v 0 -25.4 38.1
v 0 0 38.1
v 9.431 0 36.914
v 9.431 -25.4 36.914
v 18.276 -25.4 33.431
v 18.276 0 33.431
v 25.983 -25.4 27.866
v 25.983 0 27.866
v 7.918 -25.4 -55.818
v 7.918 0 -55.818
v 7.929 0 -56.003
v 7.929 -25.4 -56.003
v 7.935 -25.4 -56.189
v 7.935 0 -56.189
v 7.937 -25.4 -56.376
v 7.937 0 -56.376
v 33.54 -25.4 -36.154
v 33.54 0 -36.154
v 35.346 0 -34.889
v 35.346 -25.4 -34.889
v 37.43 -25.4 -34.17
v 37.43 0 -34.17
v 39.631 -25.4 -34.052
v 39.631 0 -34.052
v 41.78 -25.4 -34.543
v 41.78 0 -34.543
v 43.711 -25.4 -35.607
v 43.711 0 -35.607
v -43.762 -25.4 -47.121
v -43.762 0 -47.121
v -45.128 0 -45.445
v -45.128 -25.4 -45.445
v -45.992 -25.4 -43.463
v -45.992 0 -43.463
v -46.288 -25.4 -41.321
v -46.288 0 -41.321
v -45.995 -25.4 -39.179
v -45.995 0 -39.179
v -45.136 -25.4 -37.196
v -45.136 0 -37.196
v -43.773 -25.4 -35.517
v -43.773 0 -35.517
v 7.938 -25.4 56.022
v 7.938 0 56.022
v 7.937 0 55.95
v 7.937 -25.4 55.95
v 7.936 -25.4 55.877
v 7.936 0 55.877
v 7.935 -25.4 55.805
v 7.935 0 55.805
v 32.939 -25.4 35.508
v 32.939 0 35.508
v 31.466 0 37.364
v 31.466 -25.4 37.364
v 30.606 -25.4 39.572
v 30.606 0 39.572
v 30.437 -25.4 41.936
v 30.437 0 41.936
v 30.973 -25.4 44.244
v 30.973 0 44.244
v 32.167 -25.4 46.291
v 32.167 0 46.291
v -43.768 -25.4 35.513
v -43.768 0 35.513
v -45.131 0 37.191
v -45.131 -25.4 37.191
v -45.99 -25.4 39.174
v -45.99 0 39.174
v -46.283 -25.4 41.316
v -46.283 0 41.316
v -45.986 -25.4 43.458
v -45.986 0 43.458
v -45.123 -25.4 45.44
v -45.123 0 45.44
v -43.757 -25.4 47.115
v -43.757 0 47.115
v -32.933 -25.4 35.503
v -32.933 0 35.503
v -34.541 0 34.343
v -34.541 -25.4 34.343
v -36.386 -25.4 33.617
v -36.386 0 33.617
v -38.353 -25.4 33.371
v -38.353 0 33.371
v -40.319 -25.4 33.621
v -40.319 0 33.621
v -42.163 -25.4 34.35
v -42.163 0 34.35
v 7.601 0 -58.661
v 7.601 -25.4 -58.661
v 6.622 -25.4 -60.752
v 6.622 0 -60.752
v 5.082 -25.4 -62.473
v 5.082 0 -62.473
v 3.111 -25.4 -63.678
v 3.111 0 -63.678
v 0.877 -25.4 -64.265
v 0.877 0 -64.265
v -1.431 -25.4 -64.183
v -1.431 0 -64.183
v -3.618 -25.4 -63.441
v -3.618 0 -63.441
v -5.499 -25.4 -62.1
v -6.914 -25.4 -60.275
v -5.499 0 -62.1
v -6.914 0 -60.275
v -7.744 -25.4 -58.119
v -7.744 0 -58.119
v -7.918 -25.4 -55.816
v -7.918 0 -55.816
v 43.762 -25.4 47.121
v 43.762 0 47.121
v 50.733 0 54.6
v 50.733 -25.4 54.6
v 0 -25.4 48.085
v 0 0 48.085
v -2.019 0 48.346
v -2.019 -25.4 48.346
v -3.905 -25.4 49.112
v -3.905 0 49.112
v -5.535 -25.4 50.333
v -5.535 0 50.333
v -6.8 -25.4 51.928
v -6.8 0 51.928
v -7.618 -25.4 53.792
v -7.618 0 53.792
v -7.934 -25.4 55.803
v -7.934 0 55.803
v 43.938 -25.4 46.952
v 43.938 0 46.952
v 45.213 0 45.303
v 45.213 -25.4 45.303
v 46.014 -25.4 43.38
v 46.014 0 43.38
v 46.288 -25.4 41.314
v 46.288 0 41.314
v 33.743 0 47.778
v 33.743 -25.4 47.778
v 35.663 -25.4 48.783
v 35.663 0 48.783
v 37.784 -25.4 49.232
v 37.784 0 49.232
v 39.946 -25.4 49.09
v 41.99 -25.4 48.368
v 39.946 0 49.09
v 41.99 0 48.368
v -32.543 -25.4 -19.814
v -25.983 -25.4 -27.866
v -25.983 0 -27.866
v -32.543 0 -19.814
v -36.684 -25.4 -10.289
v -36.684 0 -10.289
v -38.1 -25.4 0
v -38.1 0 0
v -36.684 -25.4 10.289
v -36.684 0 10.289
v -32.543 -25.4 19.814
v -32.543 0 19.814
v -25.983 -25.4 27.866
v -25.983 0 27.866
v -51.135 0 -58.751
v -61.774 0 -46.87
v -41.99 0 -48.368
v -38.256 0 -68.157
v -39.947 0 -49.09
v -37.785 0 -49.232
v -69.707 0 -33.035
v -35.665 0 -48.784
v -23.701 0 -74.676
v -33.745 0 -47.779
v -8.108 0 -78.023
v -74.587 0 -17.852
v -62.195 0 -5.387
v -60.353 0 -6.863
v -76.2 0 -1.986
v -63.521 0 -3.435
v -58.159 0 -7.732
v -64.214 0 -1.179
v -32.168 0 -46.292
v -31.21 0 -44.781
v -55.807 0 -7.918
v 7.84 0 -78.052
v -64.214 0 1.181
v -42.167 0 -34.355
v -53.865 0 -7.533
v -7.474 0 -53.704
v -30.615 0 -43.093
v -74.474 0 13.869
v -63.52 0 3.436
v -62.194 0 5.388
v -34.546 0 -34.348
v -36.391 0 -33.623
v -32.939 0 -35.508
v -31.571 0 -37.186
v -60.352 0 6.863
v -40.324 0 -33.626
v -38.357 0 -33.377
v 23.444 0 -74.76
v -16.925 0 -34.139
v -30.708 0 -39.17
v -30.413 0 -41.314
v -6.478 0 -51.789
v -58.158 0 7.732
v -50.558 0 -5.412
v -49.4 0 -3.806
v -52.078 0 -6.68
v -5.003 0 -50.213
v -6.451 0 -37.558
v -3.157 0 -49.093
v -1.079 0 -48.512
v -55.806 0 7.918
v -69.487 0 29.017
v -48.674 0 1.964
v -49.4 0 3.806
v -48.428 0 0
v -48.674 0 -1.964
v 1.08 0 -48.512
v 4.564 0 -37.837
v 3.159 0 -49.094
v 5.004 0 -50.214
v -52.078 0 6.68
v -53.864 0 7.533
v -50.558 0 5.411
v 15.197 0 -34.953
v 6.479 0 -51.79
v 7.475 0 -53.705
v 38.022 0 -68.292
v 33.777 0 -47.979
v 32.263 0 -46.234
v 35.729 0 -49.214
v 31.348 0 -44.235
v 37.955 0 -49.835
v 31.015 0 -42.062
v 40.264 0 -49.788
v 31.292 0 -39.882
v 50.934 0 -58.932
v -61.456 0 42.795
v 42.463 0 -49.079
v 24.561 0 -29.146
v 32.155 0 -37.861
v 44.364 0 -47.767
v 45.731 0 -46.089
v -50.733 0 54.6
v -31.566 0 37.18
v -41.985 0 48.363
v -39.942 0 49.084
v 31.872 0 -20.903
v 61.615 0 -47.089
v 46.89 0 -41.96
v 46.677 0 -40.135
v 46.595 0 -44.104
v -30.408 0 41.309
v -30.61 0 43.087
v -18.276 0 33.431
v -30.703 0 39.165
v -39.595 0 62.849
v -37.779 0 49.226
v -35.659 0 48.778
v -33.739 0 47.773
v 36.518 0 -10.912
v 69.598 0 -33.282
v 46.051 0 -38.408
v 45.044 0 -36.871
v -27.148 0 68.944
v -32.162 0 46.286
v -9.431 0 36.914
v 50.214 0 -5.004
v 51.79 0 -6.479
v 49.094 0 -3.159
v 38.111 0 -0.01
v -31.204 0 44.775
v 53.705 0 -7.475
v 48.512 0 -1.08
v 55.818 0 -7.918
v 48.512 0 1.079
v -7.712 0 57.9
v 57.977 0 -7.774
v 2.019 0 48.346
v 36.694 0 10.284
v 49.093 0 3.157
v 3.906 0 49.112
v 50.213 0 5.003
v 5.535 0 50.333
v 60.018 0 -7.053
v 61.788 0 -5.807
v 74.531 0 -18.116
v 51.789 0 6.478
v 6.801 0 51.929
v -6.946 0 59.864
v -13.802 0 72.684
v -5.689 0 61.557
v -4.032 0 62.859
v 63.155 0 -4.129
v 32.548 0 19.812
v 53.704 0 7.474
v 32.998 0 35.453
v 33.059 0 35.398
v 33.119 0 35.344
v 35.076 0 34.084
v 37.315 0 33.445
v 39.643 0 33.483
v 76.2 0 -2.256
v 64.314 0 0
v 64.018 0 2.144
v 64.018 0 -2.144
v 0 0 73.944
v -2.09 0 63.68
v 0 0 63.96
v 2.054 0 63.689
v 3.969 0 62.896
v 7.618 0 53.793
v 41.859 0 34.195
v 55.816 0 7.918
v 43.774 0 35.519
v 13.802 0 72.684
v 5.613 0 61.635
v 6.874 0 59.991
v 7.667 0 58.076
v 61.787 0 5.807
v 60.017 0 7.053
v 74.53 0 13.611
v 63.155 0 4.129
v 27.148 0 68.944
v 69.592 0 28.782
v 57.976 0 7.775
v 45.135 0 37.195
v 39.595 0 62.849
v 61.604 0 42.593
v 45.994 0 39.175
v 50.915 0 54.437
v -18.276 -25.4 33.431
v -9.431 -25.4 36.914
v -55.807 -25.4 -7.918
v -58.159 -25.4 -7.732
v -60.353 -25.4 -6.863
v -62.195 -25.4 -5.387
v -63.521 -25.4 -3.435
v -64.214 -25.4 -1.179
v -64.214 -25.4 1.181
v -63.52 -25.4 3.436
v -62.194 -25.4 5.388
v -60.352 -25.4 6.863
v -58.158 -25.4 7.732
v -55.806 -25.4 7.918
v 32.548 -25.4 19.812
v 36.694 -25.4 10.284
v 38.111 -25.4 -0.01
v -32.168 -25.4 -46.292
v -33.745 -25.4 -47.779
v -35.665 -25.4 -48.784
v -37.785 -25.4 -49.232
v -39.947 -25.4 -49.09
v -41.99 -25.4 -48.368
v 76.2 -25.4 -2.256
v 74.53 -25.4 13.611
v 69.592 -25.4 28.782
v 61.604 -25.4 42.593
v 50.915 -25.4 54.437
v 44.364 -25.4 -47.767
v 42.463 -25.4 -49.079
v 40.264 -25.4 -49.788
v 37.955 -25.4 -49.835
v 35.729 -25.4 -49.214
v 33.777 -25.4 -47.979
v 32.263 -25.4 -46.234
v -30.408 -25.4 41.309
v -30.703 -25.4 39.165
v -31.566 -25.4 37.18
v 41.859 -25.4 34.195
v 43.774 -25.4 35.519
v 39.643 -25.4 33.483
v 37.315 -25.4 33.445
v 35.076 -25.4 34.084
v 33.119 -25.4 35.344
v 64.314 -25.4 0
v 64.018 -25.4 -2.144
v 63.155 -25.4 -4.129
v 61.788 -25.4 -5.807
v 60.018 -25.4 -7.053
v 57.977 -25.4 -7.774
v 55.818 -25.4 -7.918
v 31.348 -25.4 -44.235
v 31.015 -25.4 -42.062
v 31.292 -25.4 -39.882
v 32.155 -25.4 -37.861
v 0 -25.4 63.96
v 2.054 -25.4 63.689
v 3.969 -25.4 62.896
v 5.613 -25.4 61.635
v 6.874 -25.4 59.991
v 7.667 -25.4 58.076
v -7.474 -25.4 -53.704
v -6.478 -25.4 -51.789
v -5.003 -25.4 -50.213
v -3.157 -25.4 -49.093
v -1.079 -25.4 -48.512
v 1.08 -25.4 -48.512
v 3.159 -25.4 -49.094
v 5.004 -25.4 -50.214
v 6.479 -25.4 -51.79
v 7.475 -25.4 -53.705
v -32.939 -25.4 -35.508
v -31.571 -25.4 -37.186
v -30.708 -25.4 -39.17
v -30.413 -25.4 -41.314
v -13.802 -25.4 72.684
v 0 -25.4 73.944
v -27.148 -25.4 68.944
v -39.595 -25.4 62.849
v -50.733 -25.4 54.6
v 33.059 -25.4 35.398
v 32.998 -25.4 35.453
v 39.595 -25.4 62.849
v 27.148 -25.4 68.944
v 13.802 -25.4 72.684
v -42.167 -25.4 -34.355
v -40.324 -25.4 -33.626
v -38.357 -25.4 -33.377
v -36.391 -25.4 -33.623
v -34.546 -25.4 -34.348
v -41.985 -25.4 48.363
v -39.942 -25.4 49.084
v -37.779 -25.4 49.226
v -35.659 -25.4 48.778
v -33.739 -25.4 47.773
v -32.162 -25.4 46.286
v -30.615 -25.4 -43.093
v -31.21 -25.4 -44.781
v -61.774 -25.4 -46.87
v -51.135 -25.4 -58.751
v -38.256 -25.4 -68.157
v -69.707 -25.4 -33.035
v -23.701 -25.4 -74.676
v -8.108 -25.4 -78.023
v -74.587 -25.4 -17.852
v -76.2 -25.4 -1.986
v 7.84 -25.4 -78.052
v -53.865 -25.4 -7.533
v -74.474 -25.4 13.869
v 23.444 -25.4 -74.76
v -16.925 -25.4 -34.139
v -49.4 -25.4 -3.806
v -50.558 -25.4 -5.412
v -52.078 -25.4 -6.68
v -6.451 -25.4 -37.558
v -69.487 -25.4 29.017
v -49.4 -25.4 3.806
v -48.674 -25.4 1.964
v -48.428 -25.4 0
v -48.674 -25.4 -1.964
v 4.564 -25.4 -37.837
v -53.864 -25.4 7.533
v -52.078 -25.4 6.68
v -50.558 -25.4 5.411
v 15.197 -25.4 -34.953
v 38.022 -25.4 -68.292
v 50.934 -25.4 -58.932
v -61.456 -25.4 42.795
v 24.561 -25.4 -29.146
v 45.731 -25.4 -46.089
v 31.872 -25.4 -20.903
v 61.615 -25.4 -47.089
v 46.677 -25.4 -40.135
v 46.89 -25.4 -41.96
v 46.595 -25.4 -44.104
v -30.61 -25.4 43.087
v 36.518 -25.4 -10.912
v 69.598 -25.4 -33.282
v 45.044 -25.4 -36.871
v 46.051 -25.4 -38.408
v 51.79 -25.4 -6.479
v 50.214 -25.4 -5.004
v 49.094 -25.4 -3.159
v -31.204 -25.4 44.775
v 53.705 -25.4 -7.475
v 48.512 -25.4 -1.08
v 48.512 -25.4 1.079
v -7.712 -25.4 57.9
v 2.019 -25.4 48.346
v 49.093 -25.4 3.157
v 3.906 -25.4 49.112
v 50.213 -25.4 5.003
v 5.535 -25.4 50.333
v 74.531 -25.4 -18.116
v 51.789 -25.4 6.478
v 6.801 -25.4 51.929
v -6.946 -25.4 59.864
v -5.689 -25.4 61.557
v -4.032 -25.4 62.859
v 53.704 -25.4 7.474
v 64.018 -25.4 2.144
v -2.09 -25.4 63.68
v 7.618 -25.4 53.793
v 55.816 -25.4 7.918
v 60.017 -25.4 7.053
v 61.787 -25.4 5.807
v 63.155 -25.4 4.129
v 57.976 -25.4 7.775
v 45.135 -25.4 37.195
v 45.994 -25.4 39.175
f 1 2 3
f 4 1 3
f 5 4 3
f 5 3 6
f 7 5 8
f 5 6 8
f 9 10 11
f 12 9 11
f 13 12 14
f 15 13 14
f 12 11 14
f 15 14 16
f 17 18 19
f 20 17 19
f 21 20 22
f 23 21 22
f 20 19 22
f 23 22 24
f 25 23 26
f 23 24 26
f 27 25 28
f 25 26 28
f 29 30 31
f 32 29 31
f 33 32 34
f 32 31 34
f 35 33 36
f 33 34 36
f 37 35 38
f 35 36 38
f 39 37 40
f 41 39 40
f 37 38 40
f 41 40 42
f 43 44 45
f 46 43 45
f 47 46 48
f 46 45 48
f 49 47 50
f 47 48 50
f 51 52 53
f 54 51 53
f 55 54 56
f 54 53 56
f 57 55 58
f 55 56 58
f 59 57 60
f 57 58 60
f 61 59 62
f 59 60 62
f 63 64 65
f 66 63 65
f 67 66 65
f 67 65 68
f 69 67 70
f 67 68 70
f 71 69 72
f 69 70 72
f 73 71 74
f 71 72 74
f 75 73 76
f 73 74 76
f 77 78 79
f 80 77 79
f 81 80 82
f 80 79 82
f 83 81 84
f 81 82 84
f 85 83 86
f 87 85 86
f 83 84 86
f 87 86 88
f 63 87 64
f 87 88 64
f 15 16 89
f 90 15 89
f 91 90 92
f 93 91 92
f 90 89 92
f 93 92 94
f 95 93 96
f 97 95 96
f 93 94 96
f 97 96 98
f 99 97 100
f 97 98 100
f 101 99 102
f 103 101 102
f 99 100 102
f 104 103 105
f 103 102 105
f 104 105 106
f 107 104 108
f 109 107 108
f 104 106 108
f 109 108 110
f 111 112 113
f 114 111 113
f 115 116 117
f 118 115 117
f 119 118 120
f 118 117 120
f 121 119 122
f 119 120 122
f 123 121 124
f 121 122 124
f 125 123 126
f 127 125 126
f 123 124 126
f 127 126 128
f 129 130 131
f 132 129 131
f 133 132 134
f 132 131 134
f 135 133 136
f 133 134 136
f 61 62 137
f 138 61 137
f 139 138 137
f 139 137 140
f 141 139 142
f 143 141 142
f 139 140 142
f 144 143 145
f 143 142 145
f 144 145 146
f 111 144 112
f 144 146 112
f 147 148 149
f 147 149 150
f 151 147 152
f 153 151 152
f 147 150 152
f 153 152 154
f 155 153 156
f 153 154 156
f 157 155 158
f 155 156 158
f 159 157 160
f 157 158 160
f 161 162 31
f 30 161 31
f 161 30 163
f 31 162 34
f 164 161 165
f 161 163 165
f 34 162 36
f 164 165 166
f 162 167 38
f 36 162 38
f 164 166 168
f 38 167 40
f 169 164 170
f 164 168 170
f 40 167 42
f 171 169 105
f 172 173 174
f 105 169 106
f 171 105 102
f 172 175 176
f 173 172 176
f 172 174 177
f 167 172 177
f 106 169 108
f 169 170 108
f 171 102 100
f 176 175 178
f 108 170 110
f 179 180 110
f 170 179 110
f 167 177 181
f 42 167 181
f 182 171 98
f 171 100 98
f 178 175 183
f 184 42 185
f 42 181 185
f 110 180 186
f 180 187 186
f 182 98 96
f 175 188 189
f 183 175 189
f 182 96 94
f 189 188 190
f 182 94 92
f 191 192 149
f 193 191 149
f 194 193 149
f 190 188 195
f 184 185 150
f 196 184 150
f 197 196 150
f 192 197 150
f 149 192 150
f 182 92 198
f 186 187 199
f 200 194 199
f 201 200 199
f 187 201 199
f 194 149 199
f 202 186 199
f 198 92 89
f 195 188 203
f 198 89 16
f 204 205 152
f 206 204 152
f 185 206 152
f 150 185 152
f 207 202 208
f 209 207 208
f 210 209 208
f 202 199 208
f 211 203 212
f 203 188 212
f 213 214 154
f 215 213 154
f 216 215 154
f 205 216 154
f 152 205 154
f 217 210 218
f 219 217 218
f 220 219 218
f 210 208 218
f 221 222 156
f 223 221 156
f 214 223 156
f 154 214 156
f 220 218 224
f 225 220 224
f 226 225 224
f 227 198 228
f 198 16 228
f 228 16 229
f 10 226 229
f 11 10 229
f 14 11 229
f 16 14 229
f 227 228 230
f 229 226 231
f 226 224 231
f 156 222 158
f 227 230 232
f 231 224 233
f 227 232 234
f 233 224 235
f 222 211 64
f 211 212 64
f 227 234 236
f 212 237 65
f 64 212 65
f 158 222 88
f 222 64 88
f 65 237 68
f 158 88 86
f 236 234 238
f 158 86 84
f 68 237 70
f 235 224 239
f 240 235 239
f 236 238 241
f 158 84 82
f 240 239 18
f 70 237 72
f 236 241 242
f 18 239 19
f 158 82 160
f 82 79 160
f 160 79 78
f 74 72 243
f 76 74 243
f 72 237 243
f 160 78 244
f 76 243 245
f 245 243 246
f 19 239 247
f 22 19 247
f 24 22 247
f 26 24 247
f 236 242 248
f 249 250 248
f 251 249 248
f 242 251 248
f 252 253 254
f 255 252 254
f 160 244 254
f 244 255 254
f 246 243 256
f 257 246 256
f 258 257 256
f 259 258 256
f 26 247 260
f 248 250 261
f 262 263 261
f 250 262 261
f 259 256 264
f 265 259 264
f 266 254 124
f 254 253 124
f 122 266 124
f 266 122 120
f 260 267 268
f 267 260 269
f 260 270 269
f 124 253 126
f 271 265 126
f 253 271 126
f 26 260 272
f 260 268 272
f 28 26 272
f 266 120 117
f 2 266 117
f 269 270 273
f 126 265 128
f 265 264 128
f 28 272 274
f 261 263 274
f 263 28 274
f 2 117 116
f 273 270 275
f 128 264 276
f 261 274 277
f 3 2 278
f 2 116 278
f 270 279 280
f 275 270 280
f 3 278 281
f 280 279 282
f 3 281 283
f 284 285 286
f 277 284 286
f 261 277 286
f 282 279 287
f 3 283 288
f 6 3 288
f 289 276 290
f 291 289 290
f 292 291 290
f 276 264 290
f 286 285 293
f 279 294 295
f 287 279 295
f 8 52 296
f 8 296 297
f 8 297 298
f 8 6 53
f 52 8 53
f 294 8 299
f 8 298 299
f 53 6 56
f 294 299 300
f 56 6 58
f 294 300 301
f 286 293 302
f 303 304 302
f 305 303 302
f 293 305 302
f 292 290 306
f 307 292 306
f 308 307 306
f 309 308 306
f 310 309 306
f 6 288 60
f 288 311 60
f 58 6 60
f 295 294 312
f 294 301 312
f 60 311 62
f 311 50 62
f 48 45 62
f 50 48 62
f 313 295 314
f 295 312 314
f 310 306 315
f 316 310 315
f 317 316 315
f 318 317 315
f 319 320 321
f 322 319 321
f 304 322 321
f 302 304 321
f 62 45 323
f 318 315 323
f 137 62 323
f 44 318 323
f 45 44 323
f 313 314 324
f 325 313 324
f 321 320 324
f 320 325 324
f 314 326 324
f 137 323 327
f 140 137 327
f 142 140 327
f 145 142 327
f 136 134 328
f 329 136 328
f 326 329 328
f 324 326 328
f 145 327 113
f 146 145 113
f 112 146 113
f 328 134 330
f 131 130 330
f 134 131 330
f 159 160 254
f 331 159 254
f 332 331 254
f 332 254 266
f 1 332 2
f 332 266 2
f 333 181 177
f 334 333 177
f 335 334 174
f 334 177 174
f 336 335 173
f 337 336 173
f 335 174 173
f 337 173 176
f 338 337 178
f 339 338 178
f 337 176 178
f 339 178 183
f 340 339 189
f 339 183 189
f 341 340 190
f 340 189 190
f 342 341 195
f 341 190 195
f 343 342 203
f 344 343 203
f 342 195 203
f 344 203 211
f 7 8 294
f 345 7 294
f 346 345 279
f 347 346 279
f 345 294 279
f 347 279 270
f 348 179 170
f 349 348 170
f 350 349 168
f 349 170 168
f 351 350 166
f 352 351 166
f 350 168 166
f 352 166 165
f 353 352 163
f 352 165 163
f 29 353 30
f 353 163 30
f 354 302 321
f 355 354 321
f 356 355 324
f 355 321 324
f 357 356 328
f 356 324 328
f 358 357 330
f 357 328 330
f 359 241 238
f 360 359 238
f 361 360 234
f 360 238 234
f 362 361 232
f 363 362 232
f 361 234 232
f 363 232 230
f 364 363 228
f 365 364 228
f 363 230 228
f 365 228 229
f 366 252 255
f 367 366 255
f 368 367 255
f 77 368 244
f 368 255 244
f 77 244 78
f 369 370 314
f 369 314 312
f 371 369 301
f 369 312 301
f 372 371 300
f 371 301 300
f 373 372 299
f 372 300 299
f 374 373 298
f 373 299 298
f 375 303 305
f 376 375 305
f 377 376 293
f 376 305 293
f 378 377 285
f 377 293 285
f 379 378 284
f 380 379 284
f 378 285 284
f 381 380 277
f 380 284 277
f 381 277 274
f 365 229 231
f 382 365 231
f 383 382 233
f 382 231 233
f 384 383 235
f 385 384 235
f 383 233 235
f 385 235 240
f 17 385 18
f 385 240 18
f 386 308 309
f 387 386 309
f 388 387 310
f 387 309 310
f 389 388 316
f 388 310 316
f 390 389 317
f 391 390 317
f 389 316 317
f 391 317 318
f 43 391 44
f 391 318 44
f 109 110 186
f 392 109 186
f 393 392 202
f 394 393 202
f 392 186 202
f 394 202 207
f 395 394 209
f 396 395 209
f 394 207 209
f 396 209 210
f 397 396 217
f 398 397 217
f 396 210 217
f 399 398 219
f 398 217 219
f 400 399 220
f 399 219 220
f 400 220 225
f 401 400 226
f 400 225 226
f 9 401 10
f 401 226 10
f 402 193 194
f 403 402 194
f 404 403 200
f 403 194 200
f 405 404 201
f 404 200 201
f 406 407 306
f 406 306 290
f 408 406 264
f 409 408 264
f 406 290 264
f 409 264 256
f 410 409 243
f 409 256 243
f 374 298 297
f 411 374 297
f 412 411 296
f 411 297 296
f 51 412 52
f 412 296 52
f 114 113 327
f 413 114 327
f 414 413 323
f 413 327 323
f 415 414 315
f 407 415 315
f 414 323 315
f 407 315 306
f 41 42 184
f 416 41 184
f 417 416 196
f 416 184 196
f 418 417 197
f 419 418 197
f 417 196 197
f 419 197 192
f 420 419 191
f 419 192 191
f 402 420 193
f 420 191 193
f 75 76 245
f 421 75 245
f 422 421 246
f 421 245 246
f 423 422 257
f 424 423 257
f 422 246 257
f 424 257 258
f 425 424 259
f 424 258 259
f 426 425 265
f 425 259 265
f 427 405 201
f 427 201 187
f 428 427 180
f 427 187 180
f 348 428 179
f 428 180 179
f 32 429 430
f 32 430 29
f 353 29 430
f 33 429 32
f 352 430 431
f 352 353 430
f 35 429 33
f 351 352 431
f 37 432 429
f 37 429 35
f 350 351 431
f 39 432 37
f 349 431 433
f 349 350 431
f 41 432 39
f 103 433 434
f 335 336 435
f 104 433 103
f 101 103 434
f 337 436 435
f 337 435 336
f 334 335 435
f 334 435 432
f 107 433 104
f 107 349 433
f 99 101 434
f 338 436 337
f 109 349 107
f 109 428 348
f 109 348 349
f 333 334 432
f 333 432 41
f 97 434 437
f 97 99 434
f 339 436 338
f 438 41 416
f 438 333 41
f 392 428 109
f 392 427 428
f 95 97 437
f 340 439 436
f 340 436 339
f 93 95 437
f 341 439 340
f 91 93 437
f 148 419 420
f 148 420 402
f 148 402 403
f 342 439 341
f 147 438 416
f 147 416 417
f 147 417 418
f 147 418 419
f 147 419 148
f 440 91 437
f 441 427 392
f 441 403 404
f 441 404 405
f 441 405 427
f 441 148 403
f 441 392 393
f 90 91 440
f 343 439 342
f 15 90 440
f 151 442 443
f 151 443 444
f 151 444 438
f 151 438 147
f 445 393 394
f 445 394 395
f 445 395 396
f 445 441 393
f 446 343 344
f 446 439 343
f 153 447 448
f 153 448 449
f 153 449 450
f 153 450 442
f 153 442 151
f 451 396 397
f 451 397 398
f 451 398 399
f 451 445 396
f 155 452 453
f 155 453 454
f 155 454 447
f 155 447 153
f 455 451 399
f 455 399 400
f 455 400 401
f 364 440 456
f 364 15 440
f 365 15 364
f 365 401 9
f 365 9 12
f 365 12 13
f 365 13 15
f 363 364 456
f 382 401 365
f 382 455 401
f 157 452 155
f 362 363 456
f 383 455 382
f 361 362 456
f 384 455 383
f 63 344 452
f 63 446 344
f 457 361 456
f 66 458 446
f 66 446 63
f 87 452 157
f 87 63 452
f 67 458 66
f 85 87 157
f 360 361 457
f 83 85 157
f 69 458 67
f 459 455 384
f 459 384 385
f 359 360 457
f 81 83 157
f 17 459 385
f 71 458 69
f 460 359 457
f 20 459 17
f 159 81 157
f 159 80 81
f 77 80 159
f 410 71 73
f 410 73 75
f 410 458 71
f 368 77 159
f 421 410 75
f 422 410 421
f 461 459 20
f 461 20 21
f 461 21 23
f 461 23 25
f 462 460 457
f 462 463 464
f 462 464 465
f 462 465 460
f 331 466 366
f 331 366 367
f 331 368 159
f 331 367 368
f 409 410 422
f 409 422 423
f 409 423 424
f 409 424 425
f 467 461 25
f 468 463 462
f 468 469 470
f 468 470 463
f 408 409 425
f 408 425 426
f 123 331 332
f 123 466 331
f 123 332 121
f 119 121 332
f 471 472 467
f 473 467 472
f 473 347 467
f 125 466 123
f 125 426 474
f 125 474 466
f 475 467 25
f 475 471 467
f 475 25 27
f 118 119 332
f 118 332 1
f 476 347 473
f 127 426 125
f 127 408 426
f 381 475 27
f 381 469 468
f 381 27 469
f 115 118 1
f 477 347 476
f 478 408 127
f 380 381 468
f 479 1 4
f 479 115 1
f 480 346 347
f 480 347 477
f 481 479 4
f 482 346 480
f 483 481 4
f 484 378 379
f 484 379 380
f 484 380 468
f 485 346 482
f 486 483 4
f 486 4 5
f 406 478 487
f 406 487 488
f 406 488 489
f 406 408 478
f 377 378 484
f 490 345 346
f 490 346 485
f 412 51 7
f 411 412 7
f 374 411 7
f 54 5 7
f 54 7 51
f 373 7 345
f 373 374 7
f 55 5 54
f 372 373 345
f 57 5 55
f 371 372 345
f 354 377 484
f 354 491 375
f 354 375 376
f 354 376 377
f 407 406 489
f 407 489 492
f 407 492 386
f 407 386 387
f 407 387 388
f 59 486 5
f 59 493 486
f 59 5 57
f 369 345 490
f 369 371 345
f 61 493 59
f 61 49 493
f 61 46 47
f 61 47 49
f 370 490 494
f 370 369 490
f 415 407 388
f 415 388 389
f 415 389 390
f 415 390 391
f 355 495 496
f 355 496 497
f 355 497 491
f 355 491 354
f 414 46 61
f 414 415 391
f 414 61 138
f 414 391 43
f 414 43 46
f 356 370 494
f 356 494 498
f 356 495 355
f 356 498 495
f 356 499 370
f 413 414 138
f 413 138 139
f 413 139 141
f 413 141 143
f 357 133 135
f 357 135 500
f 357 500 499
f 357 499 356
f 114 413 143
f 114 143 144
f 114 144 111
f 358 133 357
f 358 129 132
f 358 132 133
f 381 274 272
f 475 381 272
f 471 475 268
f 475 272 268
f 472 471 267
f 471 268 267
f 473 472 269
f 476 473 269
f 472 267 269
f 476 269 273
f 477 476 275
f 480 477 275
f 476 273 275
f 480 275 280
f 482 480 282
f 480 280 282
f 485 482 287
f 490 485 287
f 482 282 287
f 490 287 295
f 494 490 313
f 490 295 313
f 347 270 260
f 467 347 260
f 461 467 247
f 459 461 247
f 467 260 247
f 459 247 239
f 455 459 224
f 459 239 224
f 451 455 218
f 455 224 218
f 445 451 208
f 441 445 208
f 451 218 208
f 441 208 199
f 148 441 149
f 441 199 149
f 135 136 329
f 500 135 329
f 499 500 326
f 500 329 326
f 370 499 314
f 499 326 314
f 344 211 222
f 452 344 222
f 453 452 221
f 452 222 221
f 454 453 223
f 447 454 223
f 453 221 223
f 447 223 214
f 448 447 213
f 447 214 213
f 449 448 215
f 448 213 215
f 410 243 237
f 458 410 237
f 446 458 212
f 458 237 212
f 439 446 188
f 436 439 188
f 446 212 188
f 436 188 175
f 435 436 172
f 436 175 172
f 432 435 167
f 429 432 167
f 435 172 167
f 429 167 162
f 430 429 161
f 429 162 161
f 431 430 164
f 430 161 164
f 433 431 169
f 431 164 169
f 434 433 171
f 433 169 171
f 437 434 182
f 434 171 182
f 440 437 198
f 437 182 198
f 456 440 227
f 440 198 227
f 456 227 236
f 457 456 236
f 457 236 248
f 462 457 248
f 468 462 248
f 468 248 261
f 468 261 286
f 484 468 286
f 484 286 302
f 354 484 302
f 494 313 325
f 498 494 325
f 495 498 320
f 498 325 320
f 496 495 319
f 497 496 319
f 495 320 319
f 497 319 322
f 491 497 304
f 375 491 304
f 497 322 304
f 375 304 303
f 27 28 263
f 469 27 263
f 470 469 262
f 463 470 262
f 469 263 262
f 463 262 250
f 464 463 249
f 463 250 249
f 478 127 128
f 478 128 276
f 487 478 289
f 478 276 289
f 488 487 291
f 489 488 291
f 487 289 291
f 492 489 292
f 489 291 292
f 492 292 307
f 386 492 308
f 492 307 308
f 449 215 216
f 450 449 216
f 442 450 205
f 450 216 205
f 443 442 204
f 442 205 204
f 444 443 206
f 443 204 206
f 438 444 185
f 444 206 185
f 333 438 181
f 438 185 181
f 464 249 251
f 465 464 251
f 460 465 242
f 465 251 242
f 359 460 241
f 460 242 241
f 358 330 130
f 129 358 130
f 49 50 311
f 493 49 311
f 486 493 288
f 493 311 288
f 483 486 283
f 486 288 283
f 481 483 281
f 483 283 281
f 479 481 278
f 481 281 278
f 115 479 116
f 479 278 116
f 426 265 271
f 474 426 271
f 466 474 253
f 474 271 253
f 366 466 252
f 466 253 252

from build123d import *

# Parameters (mm, degrees)
F1_DEPTH = 25.4


# Not quite as in the source:
# - ends of sketch curves that miss each other by under 0.0002 mm in the source are joined


with BuildPart() as f1:
    # F0 (on Front) → F1 (new body)
    with BuildSketch(Plane.XZ):
        with BuildLine():
            ThreePointArc((7.9345325801, 55.8050164826), (5.535399088, 50.3331676174), (0, 48.0845394904))
            ThreePointArc((0, 48.0845394904), (-5.53484385, 50.3326274112), (-7.9344900677, 55.8034677281))
            ThreePointArc((-7.9344900677, 55.8034677281), (-20.6052011609, 52.4624086595), (-32.1621766165, 46.2861708383))
            ThreePointArc((-32.1621766165, 46.2861708383), (-30.8592654267, 43.9476457313), (-30.4078463876, 41.3089911317))
            ThreePointArc((-30.4078463876, 41.3089911317), (-31.0665806395, 38.1430038554), (-32.9334464969, 35.5025080461))
            ThreePointArc((-32.9334464969, 35.5025080461), (-38.3527879746, 33.37149462), (-43.7681241803, 35.5126658077))
            ThreePointArc((-43.7681241803, 35.5126658077), (-51.6631141521, 22.5336801806), (-55.8055284532, 7.9177526246))
            ThreePointArc((-55.8055284532, 7.9177526246), (-50.5579583584, 5.4112130729), (-48.4275815127, 0))
            ThreePointArc((-48.4275815127, 0), (-50.5584477046, -5.4117381745), (-55.8069604277, -7.917853693))
            ThreePointArc((-55.8069604277, -7.917853693), (-51.6665413057, -22.5360169357), (-43.772503534, -35.5174627239))
            ThreePointArc((-43.772503534, -35.5174627239), (-38.3573927277, -33.3769597298), (-32.9385406353, -35.5079735997))
            ThreePointArc((-32.9385406353, -35.5079735997), (-31.0716747779, -38.1484694089), (-30.412940526, -41.3144566852))
            ThreePointArc((-30.412940526, -41.3144566852), (-30.8645222652, -43.9535728332), (-32.1678845367, -46.2923987991))
            ThreePointArc((-32.1678845367, -46.2923987991), (-20.6005666804, -52.4744238707), (-7.9177489459, -55.8160418449))
            ThreePointArc((-7.9177489459, -55.8160418449), (0.0007699496, -48.4381469932), (7.917857362, -55.8175779229))
            ThreePointArc((7.917857362, -55.8175779229), (20.6543242596, -52.4575865986), (32.263311311, -46.2335565237))
            ThreePointArc((32.263311311, -46.2335565237), (31.0776824279, -40.9625014731), (33.540338967, -36.1536492228))
            ThreePointArc((33.540338967, -36.1536492228), (38.5262504819, -34.0340714863), (43.7106191867, -35.607044642))
            ThreePointArc((43.7106191867, -35.607044642), (51.6543788303, -22.5889167608), (55.8178964863, -7.917853693))
            ThreePointArc((55.8178964863, -7.917853693), (48.4385176038, -0.0007177684), (55.8164645119, 7.9177526246))
            ThreePointArc((55.8164645119, 7.9177526246), (51.6724507462, 22.537346487), (43.7740191713, 35.5188777315))
            ThreePointArc((43.7740191713, 35.5188777315), (38.4803716898, 33.3779972711), (33.1194704023, 35.3444179256))
            ThreePointArc((33.1194704023, 35.3444179256), (33.0283665185, 35.4254890622), (32.9385189369, 35.5079503192))
            ThreePointArc((32.9385189369, 35.5079503192), (30.4331832399, 40.7476116526), (32.166542765, 46.2907355552))
            ThreePointArc((32.166542765, 46.2907355552), (20.6072932493, 52.4658819521), (7.9345325801, 55.8050164826))
        make_face()
        with BuildLine():
            ThreePointArc((0, 38.1), (13.962710806, 35.4492976933), (25.9825875048, 27.8660213621))
            ThreePointArc((25.9825875048, 27.8660213621), (34.9475216227, 15.1899725896), (38.1109370587, -0.010193824))
            ThreePointArc((38.1109370587, -0.010193824), (15.1973926464, -34.9527404783), (-25.9825835021, -27.8660170726))
            ThreePointArc((-25.9825835021, -27.8660170726), (-38.1, 0), (-25.9825875048, 27.8660213621))
            ThreePointArc((-25.9825875048, 27.8660213621), (-13.962710806, 35.4492976933), (0, 38.1))
        make_face(mode=Mode.SUBTRACT)
        with BuildLine():
            ThreePointArc((-32.1621766165, 46.2861708383), (-20.6052011609, 52.4624086595), (-7.9344900677, 55.8034677281))
            ThreePointArc((-7.9344900677, 55.8034677281), (-5.6894120792, 61.5568833403), (0, 63.9595394904))
            Line((0, 63.9595394904), (0, 73.9440789808))
            ThreePointArc((0, 73.9440789808), (-27.1479472531, 68.9440014522), (-50.7331165271, 54.5999571944))
            Line((-50.7331165271, 54.5999571944), (-43.7572462783, 47.1154742172))
            ThreePointArc((-43.7572462783, 47.1154742172), (-37.7790864379, 49.2262669207), (-32.1621766165, 46.2861708383))
        make_face()
        with BuildLine():
            ThreePointArc((7.9375, 56.0220394904), (7.9367581103, 55.9135178434), (7.9345325801, 55.8050164826))
            ThreePointArc((7.9345325801, 55.8050164826), (20.6072932493, 52.4658819521), (32.166542765, 46.2907355552))
            ThreePointArc((32.166542765, 46.2907355552), (37.7835970754, 49.2316689925), (43.7623187183, 47.1209164903))
            Line((43.7623187183, 47.1209164903), (50.7331165271, 54.5999571944))
            ThreePointArc((50.7331165271, 54.5999571944), (27.1479472531, 68.9440014522), (0, 73.9440789808))
            Line((0, 73.9440789808), (0, 63.9595394904))
            ThreePointArc((0, 63.9595394904), (5.6126600757, 61.634699566), (7.9375, 56.0220394904))
        make_face()
        with BuildLine():
            ThreePointArc((-43.7681241803, 35.5126658077), (-46.2828428993, 41.3164327187), (-43.7572462783, 47.1154742172))
            Line((-43.7572462783, 47.1154742172), (-50.7331165271, 54.5999571944))
            ThreePointArc((-50.7331165271, 54.5999571944), (-31.1494504015, -71.7983666167), (76.2, -2.2559210192))
            ThreePointArc((76.2, -2.2559210192), (69.5922116943, 28.7821857449), (50.9148537664, 54.4372678657))
            Line((50.9148537664, 54.4372678657), (43.9381604406, 46.9519018008))
            ThreePointArc((43.9381604406, 46.9519018008), (45.6769666267, 44.3682185312), (46.2879188276, 41.3144334048))
            ThreePointArc((46.2879188276, 41.3144334048), (45.6323737155, 38.1557882425), (43.7740191713, 35.5188777315))
            ThreePointArc((43.7740191713, 35.5188777315), (51.6724507462, 22.537346487), (55.8164645119, 7.9177526246))
            ThreePointArc((55.8164645119, 7.9177526246), (61.7872306442, 5.8071231544), (64.3135175714, 0))
            ThreePointArc((64.3135175714, 0), (61.7877557458, -5.8066338081), (55.8178964863, -7.917853693))
            ThreePointArc((55.8178964863, -7.917853693), (51.6543788303, -22.5889167608), (43.7106191867, -35.607044642))
            ThreePointArc((43.7106191867, -35.607044642), (46.0506031098, -38.4080721744), (46.8897388577, -41.9601323083))
            ThreePointArc((46.8897388577, -41.9601323083), (46.2310046059, -45.1261195846), (44.3641387485, -47.7666153939))
            ThreePointArc((44.3641387485, -47.7666153939), (37.9546080225, -49.8346887381), (32.263311311, -46.2335565237))
            ThreePointArc((32.263311311, -46.2335565237), (20.6543242596, -52.4575865986), (7.917857362, -55.8175779229))
            ThreePointArc((7.917857362, -55.8175779229), (7.9325878205, -56.0964396499), (7.9375, -56.3756469558))
            ThreePointArc((7.9375, -56.3756469558), (-0.2799767777, -64.3082076555), (-7.9177489459, -55.8160418449))
            ThreePointArc((-7.9177489459, -55.8160418449), (-20.6005666804, -52.4744238707), (-32.1678845367, -46.2923987991))
            ThreePointArc((-32.1678845367, -46.2923987991), (-37.784668716, -49.2317673719), (-43.7623404168, -47.1209397708))
            ThreePointArc((-43.7623404168, -47.1209397708), (-46.2879374814, -41.3214088869), (-43.772503534, -35.5174627239))
            ThreePointArc((-43.772503534, -35.5174627239), (-51.6665413057, -22.5360169357), (-55.8069604277, -7.917853693))
            ThreePointArc((-55.8069604277, -7.917853693), (-64.3025814803, 0.0007177684), (-55.8055284532, 7.9177526246))
            ThreePointArc((-55.8055284532, 7.9177526246), (-51.6631141521, 22.5336801806), (-43.7681241803, 35.5126658077))
        make_face()
    extrude(amount=F1_DEPTH)


solid = f1.part
